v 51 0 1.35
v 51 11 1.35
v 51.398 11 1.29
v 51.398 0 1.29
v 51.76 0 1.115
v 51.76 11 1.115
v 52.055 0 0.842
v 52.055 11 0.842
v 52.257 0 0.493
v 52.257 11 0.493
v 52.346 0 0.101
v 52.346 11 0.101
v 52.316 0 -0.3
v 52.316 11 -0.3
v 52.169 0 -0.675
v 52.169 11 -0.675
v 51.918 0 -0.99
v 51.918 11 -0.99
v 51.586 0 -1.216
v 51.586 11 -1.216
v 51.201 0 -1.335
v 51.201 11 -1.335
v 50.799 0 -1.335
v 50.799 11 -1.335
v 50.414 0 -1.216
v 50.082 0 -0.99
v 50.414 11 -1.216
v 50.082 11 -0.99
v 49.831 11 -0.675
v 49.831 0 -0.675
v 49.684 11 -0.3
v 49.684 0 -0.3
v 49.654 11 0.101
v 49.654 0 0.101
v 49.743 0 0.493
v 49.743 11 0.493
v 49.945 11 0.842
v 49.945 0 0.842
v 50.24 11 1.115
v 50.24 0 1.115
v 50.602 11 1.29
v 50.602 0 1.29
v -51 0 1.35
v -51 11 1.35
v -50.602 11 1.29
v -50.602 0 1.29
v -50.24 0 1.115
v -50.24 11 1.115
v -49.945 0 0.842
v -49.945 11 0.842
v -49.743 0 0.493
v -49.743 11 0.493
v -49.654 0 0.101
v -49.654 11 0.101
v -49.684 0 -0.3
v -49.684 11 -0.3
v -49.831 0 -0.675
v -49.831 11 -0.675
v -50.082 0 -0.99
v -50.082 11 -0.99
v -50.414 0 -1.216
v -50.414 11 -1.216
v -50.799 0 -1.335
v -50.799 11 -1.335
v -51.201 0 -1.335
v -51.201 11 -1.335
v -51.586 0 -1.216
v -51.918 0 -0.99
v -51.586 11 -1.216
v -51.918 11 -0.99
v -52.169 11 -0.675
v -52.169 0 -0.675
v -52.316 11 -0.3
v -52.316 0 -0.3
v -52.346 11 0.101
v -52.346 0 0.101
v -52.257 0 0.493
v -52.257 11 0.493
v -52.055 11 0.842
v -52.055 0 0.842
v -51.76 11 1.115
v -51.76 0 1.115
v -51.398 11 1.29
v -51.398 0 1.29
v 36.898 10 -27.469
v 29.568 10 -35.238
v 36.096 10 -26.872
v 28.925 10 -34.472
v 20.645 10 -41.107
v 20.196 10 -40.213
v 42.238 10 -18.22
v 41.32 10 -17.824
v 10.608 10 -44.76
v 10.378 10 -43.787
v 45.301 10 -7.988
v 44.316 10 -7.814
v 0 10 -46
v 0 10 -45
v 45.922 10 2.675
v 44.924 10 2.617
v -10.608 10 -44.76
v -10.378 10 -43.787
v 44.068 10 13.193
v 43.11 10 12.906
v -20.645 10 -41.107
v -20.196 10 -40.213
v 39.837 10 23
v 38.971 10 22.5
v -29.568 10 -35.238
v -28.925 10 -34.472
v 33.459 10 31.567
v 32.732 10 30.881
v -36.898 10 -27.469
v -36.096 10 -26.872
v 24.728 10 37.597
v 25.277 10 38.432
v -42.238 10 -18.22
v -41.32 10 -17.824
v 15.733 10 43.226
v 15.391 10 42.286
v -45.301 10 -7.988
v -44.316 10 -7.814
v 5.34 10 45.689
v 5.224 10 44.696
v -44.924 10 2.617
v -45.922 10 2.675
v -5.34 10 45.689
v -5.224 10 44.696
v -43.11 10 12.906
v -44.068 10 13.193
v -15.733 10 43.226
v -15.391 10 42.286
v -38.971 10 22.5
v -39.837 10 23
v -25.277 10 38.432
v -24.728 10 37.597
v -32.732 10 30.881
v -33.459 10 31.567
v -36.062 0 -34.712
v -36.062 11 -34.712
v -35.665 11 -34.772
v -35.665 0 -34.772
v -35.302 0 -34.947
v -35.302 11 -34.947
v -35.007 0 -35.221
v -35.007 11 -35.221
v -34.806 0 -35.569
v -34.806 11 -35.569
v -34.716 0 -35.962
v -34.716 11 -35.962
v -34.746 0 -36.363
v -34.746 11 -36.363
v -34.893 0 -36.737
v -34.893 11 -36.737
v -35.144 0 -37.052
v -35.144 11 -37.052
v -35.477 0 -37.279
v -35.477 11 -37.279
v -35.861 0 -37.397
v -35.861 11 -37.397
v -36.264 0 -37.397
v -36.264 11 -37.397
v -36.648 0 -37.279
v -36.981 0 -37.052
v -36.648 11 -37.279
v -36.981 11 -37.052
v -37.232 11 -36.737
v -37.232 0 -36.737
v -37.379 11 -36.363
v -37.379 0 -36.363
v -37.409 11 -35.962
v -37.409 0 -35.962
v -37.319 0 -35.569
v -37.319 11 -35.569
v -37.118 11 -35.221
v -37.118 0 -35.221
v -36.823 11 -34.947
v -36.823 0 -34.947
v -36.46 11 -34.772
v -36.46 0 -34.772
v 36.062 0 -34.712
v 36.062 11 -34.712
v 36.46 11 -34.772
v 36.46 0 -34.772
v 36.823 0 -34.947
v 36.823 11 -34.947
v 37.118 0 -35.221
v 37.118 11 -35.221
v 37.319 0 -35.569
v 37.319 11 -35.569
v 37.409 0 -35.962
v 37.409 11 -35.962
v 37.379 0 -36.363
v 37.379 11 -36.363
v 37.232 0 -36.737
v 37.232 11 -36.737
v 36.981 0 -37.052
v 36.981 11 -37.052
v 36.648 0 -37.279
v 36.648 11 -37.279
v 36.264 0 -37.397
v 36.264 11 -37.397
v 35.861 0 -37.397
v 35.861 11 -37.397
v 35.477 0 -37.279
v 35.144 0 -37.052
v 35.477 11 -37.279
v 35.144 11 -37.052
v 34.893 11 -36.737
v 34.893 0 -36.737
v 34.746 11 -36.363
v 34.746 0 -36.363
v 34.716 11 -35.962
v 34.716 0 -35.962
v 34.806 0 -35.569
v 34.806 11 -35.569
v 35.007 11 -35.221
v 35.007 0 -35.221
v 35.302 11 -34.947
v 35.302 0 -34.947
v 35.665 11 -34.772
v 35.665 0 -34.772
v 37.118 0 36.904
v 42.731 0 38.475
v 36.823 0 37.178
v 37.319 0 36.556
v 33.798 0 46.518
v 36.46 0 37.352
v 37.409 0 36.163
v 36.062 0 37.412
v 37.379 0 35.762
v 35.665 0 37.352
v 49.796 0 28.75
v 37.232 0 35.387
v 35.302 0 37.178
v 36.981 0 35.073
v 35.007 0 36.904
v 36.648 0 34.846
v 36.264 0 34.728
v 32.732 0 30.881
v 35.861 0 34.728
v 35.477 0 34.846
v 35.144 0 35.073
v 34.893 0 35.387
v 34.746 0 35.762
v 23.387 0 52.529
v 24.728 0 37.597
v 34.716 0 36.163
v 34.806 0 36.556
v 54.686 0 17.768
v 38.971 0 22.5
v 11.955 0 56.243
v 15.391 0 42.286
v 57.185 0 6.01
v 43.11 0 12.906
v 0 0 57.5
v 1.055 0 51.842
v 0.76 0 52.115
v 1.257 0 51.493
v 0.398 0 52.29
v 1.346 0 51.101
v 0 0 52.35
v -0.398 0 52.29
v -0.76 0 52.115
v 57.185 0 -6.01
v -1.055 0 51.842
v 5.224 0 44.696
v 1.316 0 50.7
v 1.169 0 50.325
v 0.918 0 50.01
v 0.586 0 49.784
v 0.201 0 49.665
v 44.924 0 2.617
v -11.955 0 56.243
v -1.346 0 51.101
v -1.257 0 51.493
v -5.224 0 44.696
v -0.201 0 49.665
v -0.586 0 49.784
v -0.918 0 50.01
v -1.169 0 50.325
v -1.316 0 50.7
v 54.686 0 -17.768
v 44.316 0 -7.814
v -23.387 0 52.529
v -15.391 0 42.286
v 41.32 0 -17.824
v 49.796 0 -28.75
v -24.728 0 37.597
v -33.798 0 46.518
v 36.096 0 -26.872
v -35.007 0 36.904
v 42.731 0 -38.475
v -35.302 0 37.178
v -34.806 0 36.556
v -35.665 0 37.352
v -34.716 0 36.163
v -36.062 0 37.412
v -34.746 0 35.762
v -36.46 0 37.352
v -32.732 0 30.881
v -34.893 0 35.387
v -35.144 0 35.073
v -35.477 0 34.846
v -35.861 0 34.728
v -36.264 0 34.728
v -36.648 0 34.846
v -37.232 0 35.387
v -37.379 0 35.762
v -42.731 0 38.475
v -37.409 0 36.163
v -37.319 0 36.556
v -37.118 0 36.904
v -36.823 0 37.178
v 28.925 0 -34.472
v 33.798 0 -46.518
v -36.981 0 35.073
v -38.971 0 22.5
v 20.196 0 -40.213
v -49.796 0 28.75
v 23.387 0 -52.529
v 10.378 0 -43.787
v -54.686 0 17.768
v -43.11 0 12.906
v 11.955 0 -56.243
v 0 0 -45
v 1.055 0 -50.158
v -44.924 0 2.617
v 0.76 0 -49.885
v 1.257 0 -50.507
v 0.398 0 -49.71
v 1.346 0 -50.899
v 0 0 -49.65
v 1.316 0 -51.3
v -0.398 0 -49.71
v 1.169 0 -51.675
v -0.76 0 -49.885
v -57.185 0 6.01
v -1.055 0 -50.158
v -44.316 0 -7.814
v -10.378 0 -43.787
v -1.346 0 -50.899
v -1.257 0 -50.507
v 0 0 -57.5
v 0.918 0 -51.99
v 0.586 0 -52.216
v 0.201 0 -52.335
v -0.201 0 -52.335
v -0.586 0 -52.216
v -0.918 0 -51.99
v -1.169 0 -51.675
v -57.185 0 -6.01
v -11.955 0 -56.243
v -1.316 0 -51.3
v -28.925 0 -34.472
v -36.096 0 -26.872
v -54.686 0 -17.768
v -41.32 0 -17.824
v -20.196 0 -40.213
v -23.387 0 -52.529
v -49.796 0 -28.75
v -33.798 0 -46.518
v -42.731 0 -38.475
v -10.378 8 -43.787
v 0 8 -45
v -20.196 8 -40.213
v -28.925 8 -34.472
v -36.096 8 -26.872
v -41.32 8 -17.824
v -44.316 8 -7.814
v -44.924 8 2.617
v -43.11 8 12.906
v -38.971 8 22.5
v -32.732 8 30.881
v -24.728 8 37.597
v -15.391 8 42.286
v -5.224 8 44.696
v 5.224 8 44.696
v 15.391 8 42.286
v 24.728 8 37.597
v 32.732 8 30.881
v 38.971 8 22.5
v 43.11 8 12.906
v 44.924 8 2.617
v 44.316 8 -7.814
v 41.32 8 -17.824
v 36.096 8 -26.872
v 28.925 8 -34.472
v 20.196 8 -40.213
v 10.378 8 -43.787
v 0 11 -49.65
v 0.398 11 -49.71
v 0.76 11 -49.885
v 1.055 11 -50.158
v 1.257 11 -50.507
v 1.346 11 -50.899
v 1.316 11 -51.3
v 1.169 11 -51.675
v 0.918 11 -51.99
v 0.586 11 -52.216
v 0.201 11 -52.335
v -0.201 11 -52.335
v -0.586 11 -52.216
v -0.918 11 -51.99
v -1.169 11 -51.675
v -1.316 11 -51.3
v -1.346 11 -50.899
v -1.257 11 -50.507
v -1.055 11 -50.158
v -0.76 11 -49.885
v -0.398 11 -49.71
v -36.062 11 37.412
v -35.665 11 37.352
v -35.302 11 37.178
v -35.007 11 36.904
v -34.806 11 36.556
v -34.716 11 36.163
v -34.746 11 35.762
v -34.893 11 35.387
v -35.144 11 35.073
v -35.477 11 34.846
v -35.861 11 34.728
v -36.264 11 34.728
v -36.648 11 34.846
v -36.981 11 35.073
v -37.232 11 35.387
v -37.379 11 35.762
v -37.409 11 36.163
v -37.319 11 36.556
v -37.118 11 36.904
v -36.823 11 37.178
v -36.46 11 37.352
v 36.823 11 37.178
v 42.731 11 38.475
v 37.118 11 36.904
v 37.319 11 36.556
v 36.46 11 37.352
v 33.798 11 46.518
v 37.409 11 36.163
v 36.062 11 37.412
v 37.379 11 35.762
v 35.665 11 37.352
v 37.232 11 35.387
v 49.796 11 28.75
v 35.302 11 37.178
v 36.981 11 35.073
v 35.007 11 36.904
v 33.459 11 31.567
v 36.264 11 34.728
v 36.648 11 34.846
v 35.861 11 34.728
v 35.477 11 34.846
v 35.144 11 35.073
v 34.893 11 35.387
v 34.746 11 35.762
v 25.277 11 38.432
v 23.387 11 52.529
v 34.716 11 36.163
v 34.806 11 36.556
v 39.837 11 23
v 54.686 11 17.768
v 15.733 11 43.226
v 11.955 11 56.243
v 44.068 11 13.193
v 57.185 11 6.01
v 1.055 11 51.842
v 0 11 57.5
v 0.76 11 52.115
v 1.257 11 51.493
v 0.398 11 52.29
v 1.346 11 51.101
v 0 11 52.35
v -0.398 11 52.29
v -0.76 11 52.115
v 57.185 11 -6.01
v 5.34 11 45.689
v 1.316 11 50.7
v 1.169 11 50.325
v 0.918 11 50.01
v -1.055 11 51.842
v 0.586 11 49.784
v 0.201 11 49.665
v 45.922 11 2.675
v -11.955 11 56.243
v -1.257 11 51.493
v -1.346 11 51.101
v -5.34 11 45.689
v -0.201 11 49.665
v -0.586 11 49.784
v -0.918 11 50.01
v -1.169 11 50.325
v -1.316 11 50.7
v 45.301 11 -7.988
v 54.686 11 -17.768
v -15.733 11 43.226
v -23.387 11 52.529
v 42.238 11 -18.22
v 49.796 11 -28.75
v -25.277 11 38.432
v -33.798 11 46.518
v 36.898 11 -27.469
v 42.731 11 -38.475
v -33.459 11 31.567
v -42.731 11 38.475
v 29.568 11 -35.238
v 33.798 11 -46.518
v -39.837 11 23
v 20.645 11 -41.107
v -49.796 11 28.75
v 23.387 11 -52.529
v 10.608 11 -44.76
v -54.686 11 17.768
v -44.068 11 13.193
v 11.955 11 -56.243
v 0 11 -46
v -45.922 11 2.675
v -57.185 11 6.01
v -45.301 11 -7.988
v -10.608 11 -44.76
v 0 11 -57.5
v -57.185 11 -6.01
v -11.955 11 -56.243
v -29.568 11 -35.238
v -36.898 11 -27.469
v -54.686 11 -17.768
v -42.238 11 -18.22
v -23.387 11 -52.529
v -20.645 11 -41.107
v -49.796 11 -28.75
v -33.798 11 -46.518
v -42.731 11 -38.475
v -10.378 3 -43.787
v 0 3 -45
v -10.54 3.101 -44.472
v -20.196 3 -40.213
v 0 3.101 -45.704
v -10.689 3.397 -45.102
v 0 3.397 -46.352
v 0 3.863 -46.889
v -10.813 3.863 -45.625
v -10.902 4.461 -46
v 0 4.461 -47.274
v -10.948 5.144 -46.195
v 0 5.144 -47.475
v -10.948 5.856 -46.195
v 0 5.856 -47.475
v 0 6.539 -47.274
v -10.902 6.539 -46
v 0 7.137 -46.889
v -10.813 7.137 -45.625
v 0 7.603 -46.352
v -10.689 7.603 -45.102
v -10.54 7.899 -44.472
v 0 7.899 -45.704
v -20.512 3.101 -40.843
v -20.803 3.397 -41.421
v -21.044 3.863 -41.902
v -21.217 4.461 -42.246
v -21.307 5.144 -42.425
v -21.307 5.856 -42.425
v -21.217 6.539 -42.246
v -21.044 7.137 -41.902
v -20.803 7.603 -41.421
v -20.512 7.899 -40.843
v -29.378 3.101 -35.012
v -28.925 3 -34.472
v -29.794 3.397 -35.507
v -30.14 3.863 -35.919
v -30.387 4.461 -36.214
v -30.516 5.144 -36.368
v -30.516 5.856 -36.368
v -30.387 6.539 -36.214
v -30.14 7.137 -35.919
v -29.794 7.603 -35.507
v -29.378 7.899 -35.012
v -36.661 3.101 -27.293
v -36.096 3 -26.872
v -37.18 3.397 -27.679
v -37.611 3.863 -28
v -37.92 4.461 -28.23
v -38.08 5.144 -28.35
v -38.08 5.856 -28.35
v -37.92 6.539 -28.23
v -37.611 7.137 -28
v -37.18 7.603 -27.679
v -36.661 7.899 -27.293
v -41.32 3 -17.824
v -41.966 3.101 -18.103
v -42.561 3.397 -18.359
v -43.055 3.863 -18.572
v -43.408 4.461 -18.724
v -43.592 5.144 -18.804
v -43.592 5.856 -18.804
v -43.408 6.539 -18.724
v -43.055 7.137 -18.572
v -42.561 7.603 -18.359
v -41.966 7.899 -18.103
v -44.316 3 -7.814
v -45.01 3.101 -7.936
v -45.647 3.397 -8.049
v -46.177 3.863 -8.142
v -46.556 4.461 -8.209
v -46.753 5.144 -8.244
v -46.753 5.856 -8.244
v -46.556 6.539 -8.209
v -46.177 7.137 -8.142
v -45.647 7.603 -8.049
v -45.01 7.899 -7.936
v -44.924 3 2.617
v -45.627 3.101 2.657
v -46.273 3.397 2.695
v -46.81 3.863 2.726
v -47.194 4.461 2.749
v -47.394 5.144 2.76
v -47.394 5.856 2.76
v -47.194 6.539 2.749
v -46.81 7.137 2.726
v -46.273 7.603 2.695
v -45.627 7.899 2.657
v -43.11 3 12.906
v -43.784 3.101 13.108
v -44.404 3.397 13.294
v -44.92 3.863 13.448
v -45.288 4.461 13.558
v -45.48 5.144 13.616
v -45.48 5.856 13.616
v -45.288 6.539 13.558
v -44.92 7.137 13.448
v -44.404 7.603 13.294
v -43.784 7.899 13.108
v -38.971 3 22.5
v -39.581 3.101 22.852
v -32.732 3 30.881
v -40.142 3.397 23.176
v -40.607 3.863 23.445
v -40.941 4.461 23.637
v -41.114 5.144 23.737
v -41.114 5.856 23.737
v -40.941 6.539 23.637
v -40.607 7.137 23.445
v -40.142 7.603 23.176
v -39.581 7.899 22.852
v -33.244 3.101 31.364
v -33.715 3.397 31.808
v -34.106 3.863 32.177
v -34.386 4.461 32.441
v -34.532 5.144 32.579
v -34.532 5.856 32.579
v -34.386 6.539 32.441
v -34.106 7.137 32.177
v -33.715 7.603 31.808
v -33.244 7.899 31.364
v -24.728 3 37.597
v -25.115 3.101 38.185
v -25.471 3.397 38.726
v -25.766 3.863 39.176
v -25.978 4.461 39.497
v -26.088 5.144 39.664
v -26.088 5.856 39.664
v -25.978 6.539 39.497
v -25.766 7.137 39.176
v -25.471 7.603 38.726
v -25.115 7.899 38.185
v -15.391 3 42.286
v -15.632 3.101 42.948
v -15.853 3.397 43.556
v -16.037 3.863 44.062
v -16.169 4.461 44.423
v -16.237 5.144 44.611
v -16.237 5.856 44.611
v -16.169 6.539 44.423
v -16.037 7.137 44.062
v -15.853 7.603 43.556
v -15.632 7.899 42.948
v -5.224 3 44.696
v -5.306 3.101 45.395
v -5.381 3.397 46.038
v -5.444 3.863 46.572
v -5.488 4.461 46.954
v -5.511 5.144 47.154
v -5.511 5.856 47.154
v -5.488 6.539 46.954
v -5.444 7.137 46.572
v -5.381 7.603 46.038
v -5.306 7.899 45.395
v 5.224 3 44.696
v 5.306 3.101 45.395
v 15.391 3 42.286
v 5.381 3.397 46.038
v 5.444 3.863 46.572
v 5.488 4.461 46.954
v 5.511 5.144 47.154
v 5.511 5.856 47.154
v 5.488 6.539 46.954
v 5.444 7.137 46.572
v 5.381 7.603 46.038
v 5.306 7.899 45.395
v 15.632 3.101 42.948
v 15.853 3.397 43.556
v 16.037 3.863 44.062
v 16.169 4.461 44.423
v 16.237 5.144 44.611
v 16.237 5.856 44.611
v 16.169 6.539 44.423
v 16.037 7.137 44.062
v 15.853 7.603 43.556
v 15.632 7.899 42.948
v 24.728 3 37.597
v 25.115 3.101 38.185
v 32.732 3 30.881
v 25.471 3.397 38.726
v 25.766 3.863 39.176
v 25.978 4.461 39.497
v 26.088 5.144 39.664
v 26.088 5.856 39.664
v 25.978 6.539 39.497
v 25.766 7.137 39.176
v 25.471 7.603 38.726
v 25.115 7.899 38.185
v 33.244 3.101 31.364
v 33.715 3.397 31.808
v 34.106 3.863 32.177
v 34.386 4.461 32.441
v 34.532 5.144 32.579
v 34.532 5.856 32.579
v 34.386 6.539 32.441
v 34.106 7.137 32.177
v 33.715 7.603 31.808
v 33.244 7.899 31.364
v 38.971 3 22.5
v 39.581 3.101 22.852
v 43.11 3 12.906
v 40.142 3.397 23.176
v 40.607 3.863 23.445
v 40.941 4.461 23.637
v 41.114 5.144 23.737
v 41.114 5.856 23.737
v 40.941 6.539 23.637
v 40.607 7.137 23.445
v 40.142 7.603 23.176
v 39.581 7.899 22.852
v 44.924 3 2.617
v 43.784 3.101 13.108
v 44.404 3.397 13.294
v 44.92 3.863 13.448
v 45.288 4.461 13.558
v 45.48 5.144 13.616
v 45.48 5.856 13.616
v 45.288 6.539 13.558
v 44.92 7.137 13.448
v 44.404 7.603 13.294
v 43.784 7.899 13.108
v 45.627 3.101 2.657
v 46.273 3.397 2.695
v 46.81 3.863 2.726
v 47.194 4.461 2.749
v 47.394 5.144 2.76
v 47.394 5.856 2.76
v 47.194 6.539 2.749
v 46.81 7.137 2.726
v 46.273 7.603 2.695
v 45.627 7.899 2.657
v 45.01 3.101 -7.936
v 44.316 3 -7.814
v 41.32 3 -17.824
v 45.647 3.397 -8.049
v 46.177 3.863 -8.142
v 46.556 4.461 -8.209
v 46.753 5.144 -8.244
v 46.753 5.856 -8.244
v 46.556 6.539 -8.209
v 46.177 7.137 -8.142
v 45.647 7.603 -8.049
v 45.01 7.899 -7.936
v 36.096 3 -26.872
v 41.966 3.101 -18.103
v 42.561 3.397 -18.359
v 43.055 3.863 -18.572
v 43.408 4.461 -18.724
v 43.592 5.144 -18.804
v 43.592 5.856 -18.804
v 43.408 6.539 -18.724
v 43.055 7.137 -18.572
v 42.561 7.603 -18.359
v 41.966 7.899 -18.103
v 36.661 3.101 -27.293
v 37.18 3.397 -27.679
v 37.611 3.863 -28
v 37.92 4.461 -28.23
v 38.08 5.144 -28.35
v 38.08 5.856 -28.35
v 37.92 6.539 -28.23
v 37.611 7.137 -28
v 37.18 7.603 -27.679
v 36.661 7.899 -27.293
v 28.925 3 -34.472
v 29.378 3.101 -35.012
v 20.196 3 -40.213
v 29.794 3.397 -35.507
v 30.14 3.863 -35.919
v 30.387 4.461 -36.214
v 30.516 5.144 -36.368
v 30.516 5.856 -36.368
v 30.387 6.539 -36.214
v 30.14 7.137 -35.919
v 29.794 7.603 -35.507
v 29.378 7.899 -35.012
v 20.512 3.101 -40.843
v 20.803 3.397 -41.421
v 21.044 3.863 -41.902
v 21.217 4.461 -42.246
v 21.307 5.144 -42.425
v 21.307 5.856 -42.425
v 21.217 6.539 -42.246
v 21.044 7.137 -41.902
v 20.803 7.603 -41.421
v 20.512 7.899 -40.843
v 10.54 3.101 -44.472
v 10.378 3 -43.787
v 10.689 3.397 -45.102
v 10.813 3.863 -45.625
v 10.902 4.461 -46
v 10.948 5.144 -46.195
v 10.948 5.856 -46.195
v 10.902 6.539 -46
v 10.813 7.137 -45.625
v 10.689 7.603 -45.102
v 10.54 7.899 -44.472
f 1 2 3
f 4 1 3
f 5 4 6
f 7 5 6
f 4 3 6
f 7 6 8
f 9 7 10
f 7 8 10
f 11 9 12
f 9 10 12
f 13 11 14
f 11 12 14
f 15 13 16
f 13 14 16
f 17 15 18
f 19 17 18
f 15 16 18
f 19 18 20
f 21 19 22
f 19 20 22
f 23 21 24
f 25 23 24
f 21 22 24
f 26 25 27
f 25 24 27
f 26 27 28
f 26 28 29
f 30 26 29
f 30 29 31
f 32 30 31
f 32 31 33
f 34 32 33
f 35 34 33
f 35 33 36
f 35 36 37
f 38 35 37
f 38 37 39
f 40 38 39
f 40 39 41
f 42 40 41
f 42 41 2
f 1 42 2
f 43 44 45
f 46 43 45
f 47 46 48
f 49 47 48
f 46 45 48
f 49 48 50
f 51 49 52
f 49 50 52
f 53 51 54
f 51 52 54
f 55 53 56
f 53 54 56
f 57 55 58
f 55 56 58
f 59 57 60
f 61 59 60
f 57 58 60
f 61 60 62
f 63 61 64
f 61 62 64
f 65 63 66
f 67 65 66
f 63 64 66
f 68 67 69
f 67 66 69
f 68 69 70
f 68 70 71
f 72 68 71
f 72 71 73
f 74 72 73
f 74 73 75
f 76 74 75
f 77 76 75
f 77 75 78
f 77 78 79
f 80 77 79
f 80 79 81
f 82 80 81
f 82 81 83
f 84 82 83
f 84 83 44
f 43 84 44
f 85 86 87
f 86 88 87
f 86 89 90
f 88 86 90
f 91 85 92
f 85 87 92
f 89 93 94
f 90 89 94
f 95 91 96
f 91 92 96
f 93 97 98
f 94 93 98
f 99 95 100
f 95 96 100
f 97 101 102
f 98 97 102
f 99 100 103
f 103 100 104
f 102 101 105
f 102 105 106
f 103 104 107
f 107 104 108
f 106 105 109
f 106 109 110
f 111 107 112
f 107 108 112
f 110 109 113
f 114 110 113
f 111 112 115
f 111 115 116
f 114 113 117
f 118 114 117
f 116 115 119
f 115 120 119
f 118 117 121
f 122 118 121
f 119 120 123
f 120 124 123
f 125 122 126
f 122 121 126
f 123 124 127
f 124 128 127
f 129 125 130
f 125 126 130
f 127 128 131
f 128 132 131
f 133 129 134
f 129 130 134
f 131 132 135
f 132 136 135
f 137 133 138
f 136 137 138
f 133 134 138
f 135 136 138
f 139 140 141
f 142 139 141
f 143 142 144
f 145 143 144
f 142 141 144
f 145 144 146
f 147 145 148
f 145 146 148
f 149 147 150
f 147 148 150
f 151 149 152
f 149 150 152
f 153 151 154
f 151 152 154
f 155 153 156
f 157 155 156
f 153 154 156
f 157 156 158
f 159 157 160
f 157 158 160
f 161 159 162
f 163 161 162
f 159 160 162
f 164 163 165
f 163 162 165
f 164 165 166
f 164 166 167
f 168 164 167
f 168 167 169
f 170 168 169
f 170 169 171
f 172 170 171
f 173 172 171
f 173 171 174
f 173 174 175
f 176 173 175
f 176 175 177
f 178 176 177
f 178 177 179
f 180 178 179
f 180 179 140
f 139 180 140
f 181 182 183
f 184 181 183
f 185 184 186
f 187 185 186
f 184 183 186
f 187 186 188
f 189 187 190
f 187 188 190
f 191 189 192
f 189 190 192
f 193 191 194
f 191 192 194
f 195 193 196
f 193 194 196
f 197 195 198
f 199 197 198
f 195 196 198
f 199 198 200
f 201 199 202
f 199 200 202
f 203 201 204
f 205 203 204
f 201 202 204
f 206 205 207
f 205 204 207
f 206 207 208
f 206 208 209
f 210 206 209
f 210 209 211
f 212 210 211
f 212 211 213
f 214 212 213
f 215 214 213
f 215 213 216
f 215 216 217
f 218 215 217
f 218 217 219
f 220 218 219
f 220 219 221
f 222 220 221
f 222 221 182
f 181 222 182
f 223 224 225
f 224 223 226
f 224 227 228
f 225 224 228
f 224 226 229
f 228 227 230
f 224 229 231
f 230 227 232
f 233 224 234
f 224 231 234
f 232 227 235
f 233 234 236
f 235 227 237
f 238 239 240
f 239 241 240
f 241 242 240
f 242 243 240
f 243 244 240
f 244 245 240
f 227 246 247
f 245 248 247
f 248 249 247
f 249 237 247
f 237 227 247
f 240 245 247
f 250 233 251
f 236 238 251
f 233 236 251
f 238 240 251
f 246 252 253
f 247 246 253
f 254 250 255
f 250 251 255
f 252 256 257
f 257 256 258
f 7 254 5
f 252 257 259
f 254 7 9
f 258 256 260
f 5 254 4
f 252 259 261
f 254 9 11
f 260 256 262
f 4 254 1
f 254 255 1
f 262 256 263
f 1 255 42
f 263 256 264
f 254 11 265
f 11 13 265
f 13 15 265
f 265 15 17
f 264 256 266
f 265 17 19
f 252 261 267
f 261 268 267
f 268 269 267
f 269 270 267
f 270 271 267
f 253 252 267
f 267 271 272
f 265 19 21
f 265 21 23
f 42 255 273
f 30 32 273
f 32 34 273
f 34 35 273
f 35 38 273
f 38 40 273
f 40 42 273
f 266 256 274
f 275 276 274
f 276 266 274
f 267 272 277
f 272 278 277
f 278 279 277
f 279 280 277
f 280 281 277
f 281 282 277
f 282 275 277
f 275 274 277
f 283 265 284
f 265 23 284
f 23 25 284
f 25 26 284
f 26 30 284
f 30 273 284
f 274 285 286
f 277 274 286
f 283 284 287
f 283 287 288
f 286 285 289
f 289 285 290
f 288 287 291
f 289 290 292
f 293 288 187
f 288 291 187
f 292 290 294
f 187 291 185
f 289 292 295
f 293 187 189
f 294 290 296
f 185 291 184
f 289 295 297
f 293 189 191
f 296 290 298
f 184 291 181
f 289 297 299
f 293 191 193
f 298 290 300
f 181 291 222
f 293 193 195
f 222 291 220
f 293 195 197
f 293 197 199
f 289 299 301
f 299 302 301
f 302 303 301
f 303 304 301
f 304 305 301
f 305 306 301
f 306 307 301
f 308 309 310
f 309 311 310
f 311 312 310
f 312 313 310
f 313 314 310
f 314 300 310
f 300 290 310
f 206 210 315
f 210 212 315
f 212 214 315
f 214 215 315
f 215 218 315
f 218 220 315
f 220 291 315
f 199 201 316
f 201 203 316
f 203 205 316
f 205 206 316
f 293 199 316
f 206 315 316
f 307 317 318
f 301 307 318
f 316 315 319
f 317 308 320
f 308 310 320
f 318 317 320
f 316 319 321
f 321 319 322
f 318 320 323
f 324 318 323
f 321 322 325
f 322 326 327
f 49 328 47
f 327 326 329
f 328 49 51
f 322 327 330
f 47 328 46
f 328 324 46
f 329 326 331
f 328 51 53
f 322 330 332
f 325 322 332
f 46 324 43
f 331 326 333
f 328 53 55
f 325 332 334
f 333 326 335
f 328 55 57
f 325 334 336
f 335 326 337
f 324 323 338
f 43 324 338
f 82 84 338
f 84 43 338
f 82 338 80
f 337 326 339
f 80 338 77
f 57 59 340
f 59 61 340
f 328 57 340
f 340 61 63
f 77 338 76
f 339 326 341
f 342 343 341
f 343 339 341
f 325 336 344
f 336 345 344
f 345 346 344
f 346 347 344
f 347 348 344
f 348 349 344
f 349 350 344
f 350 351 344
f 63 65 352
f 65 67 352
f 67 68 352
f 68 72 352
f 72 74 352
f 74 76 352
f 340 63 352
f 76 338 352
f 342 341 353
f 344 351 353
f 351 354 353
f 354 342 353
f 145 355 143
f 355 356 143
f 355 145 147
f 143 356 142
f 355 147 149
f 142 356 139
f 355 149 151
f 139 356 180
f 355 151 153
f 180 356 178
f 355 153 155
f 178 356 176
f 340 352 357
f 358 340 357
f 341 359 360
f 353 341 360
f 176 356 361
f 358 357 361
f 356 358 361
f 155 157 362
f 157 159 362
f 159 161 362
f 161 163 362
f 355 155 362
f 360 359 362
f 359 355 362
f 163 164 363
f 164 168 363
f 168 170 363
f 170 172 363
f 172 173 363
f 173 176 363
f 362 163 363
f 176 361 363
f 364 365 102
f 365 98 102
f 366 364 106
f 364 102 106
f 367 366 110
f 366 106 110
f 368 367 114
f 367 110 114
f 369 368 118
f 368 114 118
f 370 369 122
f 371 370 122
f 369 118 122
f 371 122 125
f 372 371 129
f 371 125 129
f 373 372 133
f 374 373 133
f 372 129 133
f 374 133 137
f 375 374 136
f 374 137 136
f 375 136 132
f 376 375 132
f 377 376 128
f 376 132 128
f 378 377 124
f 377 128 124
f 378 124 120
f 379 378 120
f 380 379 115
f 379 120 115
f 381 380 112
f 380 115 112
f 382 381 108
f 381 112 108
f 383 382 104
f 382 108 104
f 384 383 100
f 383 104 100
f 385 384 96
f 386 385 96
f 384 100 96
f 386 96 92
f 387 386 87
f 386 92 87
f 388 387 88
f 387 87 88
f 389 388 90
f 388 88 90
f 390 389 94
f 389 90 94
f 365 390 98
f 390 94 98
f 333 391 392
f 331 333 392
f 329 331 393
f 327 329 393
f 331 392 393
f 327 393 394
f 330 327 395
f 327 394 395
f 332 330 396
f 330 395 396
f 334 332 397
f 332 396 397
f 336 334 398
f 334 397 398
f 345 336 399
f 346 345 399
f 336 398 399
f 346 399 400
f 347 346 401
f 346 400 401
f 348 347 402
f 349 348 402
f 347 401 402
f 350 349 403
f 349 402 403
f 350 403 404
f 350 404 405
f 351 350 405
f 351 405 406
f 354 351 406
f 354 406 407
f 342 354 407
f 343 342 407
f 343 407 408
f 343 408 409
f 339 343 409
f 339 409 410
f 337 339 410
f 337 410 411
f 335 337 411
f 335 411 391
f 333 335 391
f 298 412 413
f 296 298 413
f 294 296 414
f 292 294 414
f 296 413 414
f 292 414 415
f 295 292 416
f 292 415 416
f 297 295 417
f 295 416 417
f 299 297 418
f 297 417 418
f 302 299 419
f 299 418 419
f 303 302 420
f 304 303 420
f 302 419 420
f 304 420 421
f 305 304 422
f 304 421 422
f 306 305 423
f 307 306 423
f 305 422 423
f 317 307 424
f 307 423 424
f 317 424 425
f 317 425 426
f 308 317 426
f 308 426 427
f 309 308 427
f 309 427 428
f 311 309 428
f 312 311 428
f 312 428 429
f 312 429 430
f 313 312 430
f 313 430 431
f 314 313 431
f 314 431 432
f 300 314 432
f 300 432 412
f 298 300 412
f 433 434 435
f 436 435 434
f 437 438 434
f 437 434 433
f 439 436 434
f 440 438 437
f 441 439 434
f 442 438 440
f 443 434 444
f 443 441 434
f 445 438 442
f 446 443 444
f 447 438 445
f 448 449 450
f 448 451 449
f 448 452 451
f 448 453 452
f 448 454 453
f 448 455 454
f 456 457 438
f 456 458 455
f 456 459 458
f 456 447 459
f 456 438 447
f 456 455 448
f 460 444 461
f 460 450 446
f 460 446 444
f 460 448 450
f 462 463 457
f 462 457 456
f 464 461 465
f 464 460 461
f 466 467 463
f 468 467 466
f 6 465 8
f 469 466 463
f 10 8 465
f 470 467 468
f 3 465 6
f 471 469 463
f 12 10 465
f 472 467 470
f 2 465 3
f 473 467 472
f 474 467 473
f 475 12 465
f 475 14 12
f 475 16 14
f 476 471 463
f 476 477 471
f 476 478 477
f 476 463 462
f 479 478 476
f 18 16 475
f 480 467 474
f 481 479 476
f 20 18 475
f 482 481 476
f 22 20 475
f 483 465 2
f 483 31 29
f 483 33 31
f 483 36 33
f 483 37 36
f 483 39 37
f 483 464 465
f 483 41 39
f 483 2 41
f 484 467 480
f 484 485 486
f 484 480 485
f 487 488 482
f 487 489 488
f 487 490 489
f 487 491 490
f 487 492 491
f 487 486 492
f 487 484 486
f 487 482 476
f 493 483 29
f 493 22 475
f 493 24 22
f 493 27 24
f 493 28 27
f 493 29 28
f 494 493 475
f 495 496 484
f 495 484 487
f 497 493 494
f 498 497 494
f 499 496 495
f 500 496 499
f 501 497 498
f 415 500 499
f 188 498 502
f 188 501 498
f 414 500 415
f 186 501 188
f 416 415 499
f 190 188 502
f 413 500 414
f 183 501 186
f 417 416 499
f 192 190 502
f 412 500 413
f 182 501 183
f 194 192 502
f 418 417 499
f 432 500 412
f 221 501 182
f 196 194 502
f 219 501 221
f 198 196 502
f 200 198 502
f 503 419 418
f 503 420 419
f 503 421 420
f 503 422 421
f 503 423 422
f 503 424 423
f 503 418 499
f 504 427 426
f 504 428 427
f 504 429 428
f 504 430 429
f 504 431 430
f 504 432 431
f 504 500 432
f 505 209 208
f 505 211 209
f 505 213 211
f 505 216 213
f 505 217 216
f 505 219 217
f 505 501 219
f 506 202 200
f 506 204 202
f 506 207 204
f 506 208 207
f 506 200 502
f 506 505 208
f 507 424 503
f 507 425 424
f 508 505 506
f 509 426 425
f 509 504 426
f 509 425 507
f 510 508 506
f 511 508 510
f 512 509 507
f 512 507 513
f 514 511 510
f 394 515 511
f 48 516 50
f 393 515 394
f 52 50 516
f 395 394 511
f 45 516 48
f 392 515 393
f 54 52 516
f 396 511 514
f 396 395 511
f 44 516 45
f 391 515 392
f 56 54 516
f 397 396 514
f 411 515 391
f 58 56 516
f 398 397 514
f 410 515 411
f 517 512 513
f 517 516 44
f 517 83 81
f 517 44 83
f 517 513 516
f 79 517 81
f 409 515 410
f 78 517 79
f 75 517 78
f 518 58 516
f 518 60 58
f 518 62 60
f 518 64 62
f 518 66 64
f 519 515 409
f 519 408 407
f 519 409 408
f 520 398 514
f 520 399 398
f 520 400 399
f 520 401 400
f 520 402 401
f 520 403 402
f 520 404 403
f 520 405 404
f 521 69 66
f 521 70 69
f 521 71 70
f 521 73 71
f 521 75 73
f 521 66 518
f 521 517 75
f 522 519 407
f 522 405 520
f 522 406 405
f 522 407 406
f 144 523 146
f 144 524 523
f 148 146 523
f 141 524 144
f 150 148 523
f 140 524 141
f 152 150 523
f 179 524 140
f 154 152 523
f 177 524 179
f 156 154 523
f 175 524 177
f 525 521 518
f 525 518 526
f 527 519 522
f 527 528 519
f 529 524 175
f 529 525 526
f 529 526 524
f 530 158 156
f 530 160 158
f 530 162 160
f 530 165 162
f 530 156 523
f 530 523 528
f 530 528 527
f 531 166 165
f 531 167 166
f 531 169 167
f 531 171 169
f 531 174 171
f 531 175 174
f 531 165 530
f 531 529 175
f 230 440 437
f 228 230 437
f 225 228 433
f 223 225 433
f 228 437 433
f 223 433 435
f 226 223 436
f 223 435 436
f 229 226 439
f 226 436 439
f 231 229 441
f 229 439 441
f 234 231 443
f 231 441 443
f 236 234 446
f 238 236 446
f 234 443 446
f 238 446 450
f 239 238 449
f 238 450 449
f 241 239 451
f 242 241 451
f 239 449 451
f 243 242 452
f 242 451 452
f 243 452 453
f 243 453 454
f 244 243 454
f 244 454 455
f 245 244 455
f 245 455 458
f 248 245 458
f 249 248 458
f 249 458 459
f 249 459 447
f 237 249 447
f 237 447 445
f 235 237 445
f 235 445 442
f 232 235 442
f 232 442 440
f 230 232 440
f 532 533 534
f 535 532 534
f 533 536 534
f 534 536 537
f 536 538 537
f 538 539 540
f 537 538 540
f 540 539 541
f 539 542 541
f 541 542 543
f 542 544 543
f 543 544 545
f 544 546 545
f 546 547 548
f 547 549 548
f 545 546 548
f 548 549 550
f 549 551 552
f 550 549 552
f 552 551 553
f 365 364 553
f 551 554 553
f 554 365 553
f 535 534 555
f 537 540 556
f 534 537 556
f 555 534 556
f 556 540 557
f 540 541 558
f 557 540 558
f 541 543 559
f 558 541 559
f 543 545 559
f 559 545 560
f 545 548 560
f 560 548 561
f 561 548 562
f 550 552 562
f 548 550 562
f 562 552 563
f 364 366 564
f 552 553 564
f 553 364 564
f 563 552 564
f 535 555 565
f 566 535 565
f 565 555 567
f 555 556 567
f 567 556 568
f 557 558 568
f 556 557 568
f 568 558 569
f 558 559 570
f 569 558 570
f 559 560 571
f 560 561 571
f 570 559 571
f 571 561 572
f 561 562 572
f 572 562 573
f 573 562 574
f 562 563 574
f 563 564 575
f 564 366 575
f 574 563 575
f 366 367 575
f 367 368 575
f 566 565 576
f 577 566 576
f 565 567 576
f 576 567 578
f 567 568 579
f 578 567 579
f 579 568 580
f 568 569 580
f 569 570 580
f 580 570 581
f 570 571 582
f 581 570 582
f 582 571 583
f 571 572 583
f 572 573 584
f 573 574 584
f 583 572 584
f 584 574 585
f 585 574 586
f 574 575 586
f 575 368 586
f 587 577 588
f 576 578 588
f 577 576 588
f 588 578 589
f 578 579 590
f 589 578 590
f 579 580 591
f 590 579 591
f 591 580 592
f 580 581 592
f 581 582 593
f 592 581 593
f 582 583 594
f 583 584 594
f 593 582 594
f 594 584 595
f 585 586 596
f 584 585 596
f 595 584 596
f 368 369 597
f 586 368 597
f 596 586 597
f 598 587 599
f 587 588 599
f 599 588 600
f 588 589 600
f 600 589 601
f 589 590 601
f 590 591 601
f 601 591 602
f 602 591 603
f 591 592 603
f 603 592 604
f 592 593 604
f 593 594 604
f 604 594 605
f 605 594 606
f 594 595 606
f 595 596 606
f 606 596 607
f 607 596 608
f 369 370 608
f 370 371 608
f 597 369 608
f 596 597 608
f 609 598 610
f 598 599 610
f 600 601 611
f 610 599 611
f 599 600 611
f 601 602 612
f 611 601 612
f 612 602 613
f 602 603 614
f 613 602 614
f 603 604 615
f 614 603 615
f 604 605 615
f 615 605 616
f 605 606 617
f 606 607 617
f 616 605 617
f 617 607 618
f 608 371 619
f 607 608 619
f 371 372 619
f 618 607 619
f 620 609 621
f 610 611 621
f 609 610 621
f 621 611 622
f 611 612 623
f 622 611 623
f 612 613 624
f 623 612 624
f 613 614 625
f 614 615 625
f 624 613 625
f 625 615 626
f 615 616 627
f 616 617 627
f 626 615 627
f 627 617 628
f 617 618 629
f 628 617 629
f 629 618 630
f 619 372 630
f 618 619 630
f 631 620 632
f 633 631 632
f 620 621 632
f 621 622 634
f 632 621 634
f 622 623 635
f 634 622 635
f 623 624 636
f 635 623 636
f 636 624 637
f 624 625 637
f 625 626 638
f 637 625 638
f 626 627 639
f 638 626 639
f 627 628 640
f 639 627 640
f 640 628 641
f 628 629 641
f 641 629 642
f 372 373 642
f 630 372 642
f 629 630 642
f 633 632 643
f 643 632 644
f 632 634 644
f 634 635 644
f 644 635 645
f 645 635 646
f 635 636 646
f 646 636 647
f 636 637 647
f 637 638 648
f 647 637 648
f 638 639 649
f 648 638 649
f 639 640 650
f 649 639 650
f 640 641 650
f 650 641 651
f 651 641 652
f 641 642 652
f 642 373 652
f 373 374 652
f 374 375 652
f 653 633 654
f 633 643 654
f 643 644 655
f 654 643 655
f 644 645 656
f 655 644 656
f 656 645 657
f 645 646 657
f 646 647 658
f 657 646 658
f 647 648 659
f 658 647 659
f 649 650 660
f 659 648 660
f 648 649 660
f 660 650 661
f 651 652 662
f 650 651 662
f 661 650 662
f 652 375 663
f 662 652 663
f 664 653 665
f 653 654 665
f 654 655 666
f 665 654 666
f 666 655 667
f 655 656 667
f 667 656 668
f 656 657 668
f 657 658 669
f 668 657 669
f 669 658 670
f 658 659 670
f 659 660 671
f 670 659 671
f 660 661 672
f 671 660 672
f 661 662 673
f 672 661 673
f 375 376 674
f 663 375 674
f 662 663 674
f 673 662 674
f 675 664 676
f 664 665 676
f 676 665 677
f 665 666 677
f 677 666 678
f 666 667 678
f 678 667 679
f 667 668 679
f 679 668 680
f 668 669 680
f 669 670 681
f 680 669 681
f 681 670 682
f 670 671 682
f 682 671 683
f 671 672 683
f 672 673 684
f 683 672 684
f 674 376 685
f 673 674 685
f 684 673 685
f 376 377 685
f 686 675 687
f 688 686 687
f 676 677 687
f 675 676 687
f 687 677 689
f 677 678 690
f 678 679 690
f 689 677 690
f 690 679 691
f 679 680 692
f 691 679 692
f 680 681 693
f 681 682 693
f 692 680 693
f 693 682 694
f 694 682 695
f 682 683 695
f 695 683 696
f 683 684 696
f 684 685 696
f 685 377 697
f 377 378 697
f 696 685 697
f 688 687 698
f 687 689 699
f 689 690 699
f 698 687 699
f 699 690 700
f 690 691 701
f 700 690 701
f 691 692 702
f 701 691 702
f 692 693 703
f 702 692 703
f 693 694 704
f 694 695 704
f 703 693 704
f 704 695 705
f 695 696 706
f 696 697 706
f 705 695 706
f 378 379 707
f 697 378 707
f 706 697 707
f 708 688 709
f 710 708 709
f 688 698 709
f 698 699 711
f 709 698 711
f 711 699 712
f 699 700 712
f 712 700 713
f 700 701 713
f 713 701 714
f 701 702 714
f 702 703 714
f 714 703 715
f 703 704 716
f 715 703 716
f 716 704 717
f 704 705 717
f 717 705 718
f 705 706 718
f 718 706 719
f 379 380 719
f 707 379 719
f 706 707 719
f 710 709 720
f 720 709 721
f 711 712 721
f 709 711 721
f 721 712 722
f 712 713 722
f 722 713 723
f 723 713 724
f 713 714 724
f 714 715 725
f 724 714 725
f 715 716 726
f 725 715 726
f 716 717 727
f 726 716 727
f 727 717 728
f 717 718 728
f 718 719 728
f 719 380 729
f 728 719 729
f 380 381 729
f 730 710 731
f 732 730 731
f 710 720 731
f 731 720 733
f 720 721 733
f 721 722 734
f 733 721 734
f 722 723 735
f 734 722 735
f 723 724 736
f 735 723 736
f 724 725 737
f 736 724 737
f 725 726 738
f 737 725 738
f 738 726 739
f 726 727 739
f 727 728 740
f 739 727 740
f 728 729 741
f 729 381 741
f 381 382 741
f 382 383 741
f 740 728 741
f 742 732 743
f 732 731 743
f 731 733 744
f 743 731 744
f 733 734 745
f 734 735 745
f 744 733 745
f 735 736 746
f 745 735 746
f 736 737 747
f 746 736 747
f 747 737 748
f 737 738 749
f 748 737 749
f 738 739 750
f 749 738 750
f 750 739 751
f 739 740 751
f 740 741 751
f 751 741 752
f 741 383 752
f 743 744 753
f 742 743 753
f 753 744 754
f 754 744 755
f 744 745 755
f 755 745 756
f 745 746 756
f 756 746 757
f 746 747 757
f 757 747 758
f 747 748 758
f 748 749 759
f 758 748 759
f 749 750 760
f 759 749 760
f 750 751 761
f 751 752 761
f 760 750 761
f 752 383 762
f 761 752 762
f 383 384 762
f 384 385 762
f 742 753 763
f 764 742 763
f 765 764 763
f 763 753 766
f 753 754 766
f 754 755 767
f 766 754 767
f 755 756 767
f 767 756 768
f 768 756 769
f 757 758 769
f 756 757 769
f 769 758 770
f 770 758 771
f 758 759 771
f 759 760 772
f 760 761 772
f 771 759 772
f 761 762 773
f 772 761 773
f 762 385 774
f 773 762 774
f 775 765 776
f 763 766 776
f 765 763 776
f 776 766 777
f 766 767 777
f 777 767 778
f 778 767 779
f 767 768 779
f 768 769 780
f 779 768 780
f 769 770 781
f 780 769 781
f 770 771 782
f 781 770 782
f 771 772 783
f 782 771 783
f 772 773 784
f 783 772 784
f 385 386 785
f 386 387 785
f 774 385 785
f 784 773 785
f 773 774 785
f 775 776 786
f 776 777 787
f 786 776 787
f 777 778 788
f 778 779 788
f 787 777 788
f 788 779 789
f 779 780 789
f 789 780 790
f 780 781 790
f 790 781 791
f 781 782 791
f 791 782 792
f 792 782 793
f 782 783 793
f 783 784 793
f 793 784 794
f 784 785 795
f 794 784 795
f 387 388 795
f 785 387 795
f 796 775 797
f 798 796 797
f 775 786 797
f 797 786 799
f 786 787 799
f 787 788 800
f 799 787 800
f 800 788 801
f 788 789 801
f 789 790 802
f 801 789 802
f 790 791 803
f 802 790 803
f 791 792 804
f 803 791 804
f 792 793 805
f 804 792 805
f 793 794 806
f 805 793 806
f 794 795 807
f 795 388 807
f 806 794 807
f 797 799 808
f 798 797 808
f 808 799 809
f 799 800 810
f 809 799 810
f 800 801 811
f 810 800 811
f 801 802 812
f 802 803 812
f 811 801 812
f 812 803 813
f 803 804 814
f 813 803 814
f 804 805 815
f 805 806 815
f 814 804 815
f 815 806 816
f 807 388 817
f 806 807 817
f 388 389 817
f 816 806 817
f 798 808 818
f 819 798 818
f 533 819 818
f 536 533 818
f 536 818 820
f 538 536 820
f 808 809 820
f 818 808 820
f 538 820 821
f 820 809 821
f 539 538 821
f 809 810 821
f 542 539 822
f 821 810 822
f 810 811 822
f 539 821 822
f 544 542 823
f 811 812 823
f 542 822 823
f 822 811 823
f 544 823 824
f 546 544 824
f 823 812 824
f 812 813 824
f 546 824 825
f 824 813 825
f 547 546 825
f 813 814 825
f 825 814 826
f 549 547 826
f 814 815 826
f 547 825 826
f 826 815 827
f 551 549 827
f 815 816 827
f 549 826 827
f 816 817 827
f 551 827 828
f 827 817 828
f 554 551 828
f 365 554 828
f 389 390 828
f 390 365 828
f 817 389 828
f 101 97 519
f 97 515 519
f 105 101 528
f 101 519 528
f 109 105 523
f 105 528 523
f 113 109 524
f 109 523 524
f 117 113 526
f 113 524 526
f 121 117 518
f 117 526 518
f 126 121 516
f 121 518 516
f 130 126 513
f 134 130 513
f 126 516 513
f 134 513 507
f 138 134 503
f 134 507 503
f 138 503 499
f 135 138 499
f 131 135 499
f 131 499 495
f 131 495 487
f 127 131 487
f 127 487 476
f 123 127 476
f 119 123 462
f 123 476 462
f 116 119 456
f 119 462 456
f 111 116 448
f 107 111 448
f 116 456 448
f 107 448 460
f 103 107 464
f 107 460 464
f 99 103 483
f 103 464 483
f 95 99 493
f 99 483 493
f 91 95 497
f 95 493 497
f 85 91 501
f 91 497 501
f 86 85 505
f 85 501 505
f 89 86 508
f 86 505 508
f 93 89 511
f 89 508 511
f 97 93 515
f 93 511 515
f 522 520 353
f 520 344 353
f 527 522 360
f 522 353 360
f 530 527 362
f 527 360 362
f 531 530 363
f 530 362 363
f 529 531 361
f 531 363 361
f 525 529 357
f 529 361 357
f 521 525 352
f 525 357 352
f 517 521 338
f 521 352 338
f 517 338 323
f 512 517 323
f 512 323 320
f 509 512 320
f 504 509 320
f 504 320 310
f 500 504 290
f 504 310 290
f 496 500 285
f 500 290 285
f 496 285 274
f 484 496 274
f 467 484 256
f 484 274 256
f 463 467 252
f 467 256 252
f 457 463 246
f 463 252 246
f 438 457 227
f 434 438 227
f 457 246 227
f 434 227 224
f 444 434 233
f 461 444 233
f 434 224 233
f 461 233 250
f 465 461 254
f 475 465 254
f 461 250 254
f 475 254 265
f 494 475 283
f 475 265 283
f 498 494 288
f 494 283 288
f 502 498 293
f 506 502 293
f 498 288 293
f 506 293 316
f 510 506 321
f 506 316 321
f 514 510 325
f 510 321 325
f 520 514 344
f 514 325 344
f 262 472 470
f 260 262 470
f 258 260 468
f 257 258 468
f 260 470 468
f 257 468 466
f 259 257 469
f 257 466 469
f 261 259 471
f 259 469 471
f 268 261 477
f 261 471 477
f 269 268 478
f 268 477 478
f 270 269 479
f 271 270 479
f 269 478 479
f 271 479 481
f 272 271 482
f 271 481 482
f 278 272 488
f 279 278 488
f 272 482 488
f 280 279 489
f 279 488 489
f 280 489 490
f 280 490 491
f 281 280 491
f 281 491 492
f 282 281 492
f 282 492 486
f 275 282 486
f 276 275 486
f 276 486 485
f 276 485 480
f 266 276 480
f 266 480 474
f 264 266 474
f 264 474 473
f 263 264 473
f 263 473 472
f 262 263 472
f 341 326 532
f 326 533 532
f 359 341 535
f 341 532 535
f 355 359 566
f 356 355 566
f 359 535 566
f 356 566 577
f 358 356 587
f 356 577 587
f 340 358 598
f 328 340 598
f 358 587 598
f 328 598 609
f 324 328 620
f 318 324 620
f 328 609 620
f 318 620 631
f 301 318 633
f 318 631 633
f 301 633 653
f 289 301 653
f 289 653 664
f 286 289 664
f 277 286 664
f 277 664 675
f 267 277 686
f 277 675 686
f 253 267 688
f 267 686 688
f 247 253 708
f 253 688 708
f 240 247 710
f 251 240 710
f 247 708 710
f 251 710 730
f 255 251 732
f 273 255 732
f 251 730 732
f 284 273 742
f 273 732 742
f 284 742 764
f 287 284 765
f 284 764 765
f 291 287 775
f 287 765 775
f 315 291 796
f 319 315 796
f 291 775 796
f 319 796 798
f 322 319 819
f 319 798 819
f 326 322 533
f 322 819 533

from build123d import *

# Parameters (mm, degrees)
SKETCH2_W          = 11.5
SKETCH2_H          = 1
SKETCH3_R          = 1.35
CUT_EXTRUDE1_DEPTH = 83.057906383


with BuildPart() as part:
    # Sketch2 → Revolve1 (revolve)
    with BuildSketch(Plane.XY, mode=Mode.PRIVATE) as revolve1_sk:
        with Locations((-51.75, 10.5)):
            Rectangle(SKETCH2_W, SKETCH2_H)
        with BuildLine():
            Line((-45, 8), (-45, 10))
            Line((-45, 10), (-46, 10))
            Line((-46, 10), (-57.5, 10))
            Line((-57.5, 10), (-57.5, 0))
            Line((-57.5, 0), (-45, 0))
            Line((-45, 0), (-45, 3))
            ThreePointArc((-45, 3), (-47.5, 5.5), (-45, 8))
        make_face()
    revolve(revolve1_sk.sketch.rotate(Axis((0, 0, 0), (0, 1, 0)), 270), axis=Axis((0, 0, 0), (0, 1, 0)))

    # Sketch3 → Cut-Extrude1 (cut, through all)
    with BuildSketch(Plane(origin=(0, 11, 0), x_dir=(1, 0, 0), z_dir=(0, 1, 0))):
        with Locations(Location((-36.062445841, -36.062445841, 0), (0, 0, 270))):
            Circle(SKETCH3_R)
        with Locations(Location((0, -51, 0), (0, 0, 270))):
            Circle(SKETCH3_R)
        with Locations(Location((36.062445841, -36.062445841, 0), (0, 0, 270))):
            Circle(SKETCH3_R)
        with Locations(Location((51, 0, 0), (0, 0, 270))):
            Circle(SKETCH3_R)
        with Locations(Location((36.062445841, 36.062445841, 0), (0, 0, 270))):
            Circle(SKETCH3_R)
        with Locations(Location((0, 51, 0), (0, 0, 270))):
            Circle(SKETCH3_R)
        with Locations(Location((-36.062445841, 36.062445841, 0), (0, 0, 270))):
            Circle(SKETCH3_R)
        with Locations(Location((-51, 0, 0), (0, 0, 270))):
            Circle(SKETCH3_R)
    extrude(amount=-CUT_EXTRUDE1_DEPTH, mode=Mode.SUBTRACT)


solid = part.part
